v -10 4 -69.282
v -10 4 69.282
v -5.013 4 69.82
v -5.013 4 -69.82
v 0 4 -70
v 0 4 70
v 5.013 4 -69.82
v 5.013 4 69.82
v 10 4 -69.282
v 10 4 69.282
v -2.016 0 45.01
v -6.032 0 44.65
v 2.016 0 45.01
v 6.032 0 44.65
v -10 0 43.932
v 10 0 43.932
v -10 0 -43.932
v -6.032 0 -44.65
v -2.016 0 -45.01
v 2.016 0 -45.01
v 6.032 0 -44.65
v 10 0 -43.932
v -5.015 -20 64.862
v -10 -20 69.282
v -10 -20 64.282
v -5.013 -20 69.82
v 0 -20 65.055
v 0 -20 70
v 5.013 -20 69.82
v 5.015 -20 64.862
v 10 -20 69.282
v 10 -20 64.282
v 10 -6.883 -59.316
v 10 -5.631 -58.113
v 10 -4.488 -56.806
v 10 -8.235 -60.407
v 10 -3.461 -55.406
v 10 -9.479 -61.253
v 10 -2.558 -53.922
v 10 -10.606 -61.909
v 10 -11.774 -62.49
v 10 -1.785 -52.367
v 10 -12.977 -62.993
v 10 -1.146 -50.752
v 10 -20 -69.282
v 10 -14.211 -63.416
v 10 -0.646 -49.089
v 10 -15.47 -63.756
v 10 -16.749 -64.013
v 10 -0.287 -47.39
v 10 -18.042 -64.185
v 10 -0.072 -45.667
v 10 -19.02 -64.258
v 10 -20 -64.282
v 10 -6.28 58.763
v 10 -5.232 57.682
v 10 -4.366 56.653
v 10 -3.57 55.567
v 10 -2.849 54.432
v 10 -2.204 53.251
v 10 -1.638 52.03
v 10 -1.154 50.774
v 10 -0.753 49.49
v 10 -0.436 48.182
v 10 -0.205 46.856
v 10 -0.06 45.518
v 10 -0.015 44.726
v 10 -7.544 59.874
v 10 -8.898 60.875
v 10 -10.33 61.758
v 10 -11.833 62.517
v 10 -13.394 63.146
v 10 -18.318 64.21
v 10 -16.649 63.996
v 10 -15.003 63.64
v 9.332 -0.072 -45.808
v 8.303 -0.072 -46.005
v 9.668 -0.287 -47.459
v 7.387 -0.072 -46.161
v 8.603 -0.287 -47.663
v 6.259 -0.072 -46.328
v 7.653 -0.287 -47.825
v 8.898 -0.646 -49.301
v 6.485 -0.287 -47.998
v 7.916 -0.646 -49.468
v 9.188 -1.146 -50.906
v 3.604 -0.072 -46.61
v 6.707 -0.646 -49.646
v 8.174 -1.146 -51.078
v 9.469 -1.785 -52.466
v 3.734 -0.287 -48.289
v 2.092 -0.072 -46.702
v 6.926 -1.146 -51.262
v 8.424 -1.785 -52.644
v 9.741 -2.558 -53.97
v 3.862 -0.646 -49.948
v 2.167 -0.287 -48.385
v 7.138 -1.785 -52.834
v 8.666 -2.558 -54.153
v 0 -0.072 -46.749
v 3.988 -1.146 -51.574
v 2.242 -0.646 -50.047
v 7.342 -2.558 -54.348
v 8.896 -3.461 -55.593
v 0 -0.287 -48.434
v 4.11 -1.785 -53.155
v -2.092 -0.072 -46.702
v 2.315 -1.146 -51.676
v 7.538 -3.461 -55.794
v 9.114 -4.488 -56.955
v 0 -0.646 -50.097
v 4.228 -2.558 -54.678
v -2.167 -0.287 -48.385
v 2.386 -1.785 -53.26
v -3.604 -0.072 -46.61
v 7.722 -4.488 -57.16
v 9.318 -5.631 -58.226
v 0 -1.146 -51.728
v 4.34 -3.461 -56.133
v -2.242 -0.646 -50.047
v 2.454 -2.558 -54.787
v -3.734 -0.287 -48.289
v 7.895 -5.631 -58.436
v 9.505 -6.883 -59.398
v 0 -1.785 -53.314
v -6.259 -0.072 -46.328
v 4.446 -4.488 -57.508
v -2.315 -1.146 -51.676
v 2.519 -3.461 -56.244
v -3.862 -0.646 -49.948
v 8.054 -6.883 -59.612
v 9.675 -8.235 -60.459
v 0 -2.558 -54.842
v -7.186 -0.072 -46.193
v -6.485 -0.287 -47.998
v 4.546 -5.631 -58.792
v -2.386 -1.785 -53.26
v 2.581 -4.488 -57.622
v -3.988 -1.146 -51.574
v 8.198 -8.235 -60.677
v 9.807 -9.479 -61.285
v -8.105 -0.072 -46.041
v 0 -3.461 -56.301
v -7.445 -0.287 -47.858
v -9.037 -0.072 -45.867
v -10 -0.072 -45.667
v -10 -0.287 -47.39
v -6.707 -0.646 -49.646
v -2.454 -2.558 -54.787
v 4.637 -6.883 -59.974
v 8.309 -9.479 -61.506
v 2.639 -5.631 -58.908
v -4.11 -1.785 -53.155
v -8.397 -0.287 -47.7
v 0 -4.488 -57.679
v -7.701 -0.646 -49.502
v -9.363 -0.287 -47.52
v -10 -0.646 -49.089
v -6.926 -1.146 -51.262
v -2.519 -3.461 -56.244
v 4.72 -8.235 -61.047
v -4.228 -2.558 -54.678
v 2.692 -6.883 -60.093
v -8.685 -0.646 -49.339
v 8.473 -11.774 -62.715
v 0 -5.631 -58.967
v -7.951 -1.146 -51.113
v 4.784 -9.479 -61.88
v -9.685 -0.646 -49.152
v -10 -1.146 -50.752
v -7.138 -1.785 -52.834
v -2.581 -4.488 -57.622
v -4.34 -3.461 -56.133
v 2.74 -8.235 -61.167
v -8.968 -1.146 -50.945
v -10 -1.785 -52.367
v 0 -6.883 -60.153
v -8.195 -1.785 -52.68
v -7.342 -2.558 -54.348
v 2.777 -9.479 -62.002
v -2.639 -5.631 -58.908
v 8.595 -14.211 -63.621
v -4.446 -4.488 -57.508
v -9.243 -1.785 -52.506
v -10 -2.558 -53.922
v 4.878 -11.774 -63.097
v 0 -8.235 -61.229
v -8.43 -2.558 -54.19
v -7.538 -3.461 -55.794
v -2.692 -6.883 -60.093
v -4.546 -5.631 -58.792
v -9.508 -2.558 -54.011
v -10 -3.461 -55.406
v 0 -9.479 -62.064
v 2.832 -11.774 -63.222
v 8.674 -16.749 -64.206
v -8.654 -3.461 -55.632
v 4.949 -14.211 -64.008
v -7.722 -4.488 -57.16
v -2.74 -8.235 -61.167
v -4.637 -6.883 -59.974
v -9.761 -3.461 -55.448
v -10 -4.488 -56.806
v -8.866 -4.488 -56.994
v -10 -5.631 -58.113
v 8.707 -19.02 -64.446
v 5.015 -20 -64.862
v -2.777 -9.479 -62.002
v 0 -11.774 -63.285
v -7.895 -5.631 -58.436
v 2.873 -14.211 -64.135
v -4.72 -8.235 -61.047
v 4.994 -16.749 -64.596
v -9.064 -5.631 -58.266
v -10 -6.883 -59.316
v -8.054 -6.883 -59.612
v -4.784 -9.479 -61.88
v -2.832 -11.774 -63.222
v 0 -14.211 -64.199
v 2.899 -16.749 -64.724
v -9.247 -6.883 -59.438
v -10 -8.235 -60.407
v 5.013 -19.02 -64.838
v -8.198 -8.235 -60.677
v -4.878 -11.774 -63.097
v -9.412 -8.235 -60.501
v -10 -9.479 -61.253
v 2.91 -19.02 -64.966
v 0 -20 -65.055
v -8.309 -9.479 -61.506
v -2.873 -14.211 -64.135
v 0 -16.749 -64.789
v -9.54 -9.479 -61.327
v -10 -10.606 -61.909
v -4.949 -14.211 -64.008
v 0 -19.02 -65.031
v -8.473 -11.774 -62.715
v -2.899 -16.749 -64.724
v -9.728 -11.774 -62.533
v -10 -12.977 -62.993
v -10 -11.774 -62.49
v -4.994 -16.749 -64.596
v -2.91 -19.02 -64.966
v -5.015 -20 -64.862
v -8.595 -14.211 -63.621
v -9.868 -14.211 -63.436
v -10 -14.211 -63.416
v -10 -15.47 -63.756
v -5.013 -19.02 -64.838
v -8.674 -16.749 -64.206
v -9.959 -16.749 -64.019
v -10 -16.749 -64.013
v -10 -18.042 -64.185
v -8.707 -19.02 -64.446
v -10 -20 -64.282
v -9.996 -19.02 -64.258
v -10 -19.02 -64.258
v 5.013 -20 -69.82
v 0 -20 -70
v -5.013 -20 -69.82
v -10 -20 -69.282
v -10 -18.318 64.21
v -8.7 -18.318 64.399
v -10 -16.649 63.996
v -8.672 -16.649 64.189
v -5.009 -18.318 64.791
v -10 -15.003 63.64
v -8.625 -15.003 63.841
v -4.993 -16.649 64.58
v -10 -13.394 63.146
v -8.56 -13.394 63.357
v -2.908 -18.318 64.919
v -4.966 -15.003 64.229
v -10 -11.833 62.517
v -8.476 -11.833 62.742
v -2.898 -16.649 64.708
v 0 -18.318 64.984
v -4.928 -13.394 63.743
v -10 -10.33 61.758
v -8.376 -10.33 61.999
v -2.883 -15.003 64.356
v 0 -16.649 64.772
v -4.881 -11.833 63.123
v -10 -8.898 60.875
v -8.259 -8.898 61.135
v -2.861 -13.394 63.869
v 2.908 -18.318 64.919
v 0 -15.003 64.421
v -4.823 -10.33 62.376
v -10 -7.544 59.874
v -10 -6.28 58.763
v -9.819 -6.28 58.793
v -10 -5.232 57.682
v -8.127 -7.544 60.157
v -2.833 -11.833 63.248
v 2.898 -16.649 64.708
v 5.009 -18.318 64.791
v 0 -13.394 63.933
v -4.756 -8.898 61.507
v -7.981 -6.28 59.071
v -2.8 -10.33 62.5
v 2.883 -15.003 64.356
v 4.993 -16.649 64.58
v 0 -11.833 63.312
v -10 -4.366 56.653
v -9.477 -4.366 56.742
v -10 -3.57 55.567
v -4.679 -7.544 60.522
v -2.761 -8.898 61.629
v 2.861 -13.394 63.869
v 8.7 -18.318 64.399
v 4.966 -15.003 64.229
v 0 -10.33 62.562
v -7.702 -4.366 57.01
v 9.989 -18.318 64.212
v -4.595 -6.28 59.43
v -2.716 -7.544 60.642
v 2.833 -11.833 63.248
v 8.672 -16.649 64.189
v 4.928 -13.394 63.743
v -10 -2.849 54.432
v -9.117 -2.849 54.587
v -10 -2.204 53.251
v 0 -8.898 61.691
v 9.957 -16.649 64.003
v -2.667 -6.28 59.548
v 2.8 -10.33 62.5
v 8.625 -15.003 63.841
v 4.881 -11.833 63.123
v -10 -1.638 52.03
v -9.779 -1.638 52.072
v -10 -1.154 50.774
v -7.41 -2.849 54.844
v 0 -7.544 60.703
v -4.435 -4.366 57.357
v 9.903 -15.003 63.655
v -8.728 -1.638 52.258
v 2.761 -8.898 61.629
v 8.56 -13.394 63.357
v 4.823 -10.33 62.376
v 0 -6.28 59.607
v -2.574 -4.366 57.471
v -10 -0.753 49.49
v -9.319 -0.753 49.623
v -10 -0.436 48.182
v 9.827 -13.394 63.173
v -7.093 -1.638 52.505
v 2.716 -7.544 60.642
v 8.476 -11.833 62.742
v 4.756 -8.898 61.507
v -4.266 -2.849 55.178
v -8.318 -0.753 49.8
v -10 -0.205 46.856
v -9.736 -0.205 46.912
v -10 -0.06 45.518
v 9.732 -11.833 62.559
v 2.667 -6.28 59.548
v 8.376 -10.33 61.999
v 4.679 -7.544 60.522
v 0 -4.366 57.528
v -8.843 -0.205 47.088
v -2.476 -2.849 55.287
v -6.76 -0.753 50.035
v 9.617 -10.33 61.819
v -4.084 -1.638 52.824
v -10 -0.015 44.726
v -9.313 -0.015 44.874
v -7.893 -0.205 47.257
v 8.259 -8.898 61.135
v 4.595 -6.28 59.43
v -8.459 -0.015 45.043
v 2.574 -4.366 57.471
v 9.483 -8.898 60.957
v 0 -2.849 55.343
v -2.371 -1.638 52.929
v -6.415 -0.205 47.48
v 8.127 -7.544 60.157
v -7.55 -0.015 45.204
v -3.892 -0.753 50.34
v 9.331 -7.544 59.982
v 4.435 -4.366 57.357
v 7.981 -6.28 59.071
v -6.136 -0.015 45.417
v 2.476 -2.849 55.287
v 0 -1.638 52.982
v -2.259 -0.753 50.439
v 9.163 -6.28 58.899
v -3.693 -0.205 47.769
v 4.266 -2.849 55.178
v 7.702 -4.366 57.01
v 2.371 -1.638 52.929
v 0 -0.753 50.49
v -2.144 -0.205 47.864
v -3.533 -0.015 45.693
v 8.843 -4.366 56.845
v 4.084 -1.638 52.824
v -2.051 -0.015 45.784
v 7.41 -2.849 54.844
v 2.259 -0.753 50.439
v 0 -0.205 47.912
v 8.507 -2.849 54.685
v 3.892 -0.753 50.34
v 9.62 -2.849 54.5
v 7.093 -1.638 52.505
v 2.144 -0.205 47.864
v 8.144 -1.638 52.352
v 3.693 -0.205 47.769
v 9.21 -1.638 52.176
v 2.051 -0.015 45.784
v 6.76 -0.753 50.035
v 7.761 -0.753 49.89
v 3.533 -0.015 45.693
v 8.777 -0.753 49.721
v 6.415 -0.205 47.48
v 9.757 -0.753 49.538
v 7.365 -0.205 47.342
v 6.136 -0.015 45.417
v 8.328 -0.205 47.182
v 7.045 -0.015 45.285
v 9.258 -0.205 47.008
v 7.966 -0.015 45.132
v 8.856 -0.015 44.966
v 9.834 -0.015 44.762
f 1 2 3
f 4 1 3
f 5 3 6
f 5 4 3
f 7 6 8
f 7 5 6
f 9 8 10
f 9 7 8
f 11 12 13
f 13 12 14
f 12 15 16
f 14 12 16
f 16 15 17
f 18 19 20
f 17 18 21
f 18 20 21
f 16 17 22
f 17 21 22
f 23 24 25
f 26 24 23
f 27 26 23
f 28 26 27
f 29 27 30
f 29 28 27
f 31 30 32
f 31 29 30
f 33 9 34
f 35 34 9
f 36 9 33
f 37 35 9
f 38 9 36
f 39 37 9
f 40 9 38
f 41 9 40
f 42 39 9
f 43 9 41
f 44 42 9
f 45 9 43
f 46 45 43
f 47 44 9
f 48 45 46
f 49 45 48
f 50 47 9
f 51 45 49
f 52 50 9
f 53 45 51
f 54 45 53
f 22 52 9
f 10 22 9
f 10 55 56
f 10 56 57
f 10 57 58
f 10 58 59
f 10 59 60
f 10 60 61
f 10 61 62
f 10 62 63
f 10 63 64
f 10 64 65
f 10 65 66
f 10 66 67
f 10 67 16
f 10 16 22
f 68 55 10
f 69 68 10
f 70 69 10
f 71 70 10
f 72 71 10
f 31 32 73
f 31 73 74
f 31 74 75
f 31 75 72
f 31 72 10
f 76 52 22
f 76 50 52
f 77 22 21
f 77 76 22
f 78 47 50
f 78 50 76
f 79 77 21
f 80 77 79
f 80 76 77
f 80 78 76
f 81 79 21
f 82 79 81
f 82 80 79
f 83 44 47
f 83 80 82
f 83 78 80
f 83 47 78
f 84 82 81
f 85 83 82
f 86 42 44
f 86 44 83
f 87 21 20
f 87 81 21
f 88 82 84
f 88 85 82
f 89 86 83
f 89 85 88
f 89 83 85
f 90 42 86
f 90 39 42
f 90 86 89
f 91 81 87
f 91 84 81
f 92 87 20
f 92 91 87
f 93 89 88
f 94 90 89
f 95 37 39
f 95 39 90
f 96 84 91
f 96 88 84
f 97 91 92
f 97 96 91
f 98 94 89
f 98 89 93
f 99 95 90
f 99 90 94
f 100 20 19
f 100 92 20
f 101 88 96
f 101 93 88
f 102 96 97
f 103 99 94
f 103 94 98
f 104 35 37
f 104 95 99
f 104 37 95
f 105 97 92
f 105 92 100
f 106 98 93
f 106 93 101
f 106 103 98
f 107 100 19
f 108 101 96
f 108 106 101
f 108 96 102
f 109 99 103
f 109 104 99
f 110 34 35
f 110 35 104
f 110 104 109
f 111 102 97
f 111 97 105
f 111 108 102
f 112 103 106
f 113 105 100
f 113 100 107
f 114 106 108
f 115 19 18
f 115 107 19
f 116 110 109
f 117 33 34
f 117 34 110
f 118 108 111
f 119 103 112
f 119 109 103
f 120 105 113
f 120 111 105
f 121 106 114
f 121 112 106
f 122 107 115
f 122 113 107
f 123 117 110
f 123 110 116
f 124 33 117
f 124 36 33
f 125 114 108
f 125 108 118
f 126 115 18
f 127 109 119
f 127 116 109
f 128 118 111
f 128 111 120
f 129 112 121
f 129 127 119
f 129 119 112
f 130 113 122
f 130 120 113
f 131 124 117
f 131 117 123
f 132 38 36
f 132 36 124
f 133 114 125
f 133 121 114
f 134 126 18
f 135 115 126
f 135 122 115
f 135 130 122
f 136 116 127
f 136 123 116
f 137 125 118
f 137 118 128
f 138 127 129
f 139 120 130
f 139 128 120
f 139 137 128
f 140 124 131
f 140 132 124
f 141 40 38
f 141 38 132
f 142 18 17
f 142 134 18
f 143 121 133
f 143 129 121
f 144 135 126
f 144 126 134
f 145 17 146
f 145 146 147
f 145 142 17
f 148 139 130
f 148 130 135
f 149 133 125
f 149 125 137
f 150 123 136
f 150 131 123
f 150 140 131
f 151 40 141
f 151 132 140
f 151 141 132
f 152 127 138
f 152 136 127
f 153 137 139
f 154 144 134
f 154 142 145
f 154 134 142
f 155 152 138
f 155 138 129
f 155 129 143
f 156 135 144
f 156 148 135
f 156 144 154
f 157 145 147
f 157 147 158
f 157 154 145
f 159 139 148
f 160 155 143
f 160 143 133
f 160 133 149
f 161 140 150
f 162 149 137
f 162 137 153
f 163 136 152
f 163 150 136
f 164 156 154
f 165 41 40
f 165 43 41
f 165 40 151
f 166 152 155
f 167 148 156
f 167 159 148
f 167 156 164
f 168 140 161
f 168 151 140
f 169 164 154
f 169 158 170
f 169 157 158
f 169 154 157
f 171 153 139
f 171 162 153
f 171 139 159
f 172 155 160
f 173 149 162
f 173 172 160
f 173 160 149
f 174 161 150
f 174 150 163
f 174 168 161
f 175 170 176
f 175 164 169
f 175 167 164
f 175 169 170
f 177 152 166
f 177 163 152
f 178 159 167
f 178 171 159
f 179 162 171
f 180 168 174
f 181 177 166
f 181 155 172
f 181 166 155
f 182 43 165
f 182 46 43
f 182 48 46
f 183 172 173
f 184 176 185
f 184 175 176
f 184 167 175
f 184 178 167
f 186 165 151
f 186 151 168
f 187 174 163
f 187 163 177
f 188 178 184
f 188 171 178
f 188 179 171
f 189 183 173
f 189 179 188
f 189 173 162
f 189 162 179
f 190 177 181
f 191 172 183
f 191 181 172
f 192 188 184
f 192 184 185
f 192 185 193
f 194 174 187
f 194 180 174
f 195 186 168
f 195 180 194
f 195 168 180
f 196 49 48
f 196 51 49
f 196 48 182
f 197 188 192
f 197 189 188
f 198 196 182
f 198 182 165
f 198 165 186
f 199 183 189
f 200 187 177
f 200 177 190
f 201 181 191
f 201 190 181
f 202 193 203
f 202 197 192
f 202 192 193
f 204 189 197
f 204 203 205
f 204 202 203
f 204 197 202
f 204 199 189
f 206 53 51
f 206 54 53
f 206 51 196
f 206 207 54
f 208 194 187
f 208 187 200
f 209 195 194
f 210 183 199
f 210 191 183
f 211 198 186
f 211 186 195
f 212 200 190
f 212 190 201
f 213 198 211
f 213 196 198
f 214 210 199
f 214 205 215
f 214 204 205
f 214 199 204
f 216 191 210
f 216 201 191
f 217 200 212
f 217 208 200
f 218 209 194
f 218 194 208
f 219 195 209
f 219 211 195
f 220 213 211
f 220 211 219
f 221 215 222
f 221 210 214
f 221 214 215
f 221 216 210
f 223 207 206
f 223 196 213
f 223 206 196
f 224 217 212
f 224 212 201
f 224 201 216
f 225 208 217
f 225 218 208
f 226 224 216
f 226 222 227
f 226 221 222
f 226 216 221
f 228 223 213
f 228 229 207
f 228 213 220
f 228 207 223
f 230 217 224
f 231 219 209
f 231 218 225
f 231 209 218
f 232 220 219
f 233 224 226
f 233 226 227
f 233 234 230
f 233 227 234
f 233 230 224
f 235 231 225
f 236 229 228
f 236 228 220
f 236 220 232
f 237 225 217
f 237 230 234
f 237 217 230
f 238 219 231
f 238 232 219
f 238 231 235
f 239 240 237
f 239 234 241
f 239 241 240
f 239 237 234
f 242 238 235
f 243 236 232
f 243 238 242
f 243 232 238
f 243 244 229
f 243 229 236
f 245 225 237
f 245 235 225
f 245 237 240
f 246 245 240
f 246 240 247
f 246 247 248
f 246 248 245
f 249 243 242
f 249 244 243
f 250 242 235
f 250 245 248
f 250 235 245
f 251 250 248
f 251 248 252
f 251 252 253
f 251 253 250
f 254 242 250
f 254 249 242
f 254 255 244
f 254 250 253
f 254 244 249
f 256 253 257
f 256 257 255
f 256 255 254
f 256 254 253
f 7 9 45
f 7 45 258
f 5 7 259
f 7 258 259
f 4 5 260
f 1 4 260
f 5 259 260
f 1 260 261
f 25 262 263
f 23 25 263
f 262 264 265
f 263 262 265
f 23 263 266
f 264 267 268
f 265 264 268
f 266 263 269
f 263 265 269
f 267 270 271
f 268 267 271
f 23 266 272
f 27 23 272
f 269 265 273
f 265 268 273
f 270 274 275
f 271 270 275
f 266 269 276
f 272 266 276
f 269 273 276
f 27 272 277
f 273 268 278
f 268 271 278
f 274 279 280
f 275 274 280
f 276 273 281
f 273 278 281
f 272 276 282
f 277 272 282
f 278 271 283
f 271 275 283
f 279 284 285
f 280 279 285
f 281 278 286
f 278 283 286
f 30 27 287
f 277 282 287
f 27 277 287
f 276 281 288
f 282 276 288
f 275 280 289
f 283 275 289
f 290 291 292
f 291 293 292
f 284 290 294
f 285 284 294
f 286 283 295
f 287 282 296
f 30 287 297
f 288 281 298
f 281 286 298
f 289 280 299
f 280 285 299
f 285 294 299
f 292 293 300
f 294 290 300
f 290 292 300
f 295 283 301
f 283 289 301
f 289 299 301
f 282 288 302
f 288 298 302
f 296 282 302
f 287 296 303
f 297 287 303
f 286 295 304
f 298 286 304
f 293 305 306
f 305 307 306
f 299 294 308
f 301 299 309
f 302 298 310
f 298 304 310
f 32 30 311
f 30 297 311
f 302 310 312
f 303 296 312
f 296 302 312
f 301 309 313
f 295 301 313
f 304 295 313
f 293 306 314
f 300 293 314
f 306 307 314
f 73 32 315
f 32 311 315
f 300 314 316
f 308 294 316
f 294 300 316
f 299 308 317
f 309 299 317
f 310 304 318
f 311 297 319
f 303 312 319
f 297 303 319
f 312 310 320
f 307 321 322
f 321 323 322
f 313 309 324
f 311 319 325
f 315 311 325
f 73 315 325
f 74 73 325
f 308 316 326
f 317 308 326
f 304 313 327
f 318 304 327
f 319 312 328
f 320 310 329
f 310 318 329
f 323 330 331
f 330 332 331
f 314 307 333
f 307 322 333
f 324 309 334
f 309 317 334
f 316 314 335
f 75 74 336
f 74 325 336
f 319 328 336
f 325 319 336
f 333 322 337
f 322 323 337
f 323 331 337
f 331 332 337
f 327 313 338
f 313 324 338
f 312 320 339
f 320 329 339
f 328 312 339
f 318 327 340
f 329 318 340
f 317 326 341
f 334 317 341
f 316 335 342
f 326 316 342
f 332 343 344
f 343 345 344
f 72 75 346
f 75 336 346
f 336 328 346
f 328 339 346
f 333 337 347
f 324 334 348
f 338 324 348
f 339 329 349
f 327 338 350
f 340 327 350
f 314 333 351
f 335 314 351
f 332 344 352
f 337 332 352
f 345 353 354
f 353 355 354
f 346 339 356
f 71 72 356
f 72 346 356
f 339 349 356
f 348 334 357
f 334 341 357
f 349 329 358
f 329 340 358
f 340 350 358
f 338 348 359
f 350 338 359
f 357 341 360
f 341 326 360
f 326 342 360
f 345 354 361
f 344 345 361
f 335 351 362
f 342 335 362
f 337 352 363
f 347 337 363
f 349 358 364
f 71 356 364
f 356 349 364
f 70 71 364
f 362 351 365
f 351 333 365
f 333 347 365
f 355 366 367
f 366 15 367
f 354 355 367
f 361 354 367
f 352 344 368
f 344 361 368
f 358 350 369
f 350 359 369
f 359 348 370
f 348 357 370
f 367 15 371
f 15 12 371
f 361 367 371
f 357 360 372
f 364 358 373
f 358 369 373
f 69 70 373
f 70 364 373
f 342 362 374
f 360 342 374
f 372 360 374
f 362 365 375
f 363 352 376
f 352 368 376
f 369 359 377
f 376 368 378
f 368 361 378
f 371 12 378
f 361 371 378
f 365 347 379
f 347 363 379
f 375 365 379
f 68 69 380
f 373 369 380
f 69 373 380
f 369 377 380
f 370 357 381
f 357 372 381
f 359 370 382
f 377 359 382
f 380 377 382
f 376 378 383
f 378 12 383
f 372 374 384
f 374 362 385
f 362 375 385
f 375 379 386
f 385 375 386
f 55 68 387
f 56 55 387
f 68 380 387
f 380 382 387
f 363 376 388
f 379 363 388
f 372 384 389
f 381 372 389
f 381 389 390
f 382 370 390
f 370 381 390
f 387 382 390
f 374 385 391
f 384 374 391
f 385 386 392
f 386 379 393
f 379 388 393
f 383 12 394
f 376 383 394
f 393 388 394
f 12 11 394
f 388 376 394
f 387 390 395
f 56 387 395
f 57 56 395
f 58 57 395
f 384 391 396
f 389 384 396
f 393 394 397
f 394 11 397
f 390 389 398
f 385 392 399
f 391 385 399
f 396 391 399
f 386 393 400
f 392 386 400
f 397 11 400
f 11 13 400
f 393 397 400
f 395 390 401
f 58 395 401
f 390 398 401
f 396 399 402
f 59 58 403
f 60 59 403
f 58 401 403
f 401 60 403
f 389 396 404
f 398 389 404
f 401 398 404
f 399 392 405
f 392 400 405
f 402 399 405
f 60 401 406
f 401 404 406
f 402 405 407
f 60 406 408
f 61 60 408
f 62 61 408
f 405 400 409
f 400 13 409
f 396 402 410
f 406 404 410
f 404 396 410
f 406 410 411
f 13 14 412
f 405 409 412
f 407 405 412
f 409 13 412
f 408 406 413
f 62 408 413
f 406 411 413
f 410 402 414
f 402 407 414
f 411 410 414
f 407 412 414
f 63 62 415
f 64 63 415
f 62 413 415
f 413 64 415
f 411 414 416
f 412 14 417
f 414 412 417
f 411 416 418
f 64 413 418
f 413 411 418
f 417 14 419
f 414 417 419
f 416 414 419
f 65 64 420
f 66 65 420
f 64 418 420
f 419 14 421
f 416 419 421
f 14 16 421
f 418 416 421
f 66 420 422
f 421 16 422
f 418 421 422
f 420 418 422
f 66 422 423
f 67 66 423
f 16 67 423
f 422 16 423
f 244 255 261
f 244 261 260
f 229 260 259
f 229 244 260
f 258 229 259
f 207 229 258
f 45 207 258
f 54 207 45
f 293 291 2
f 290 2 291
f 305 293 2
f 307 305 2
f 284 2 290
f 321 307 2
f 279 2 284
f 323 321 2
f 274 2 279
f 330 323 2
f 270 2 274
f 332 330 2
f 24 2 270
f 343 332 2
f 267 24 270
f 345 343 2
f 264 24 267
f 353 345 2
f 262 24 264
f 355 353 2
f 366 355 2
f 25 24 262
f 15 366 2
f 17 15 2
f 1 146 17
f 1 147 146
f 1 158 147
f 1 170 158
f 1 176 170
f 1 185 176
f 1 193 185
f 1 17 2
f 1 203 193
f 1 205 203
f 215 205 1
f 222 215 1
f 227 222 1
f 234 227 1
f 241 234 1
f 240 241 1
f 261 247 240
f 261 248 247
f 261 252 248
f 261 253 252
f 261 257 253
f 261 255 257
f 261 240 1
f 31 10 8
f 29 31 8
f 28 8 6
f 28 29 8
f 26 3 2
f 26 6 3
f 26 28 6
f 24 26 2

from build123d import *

# Parameters (mm, degrees)
AUFSATZ_LINEAR_AUSTRAGEN1_DEPTH = 4
AUFSATZ_LINEAR_START            = 20
AUFSATZ_LINEAR_AUSTRAGEN2_DEPTH = 20
VERRUNDUNG1_R                   = 20


with BuildPart() as part:
    # Skizze1 → Aufsatz-Linear austragen1 (new body)
    with BuildSketch(Plane(origin=(0, 0, 0), x_dir=(1, 0, 0), z_dir=(0, 1, 0))):
        with BuildLine():
            Line((-10, 69.282032303), (-10, -69.282032303))
            ThreePointArc((-10, -69.282032303), (0, -70), (10, -69.282032303))
            Line((10, -69.282032303), (10, 69.282032303))
            ThreePointArc((10, 69.282032303), (0, 70), (-10, 69.282032303))
        make_face()
    extrude(amount=AUFSATZ_LINEAR_AUSTRAGEN1_DEPTH)

    # Skizze2 → Aufsatz-Linear austragen2 (add)
    with BuildSketch(Plane.XZ.offset(AUFSATZ_LINEAR_START)):
        with BuildLine():
            Line((-10, 69.282032303), (-10, 64.282032303))
            ThreePointArc((-10, 64.282032303), (0, 65.055204842), (10, 64.282032303))
            Line((10, 64.282032303), (10, 69.282032303))
            ThreePointArc((10, 69.282032303), (0, 70), (-10, 69.282032303))
        make_face()
        with BuildLine():
            Line((-10, -64.282032303), (-10, -69.282032303))
            ThreePointArc((-10, -69.282032303), (0, -70), (10, -69.282032303))
            Line((10, -69.282032303), (10, -64.282032303))
            ThreePointArc((10, -64.282032303), (0, -65.055204842), (-10, -64.282032303))
        make_face()
    extrude(amount=-AUFSATZ_LINEAR_AUSTRAGEN2_DEPTH)

    # Verrundung1
    verrundung1_edges = [part.edges().sort_by_distance(p)[0] for p in [
        (0, 0, 65.055204842),
        (0, 0, -65.055204842),
    ]]
    fillet(verrundung1_edges, radius=VERRUNDUNG1_R - 0.0001)  # a hair under: the kernel refuses the full size


solid = part.part
